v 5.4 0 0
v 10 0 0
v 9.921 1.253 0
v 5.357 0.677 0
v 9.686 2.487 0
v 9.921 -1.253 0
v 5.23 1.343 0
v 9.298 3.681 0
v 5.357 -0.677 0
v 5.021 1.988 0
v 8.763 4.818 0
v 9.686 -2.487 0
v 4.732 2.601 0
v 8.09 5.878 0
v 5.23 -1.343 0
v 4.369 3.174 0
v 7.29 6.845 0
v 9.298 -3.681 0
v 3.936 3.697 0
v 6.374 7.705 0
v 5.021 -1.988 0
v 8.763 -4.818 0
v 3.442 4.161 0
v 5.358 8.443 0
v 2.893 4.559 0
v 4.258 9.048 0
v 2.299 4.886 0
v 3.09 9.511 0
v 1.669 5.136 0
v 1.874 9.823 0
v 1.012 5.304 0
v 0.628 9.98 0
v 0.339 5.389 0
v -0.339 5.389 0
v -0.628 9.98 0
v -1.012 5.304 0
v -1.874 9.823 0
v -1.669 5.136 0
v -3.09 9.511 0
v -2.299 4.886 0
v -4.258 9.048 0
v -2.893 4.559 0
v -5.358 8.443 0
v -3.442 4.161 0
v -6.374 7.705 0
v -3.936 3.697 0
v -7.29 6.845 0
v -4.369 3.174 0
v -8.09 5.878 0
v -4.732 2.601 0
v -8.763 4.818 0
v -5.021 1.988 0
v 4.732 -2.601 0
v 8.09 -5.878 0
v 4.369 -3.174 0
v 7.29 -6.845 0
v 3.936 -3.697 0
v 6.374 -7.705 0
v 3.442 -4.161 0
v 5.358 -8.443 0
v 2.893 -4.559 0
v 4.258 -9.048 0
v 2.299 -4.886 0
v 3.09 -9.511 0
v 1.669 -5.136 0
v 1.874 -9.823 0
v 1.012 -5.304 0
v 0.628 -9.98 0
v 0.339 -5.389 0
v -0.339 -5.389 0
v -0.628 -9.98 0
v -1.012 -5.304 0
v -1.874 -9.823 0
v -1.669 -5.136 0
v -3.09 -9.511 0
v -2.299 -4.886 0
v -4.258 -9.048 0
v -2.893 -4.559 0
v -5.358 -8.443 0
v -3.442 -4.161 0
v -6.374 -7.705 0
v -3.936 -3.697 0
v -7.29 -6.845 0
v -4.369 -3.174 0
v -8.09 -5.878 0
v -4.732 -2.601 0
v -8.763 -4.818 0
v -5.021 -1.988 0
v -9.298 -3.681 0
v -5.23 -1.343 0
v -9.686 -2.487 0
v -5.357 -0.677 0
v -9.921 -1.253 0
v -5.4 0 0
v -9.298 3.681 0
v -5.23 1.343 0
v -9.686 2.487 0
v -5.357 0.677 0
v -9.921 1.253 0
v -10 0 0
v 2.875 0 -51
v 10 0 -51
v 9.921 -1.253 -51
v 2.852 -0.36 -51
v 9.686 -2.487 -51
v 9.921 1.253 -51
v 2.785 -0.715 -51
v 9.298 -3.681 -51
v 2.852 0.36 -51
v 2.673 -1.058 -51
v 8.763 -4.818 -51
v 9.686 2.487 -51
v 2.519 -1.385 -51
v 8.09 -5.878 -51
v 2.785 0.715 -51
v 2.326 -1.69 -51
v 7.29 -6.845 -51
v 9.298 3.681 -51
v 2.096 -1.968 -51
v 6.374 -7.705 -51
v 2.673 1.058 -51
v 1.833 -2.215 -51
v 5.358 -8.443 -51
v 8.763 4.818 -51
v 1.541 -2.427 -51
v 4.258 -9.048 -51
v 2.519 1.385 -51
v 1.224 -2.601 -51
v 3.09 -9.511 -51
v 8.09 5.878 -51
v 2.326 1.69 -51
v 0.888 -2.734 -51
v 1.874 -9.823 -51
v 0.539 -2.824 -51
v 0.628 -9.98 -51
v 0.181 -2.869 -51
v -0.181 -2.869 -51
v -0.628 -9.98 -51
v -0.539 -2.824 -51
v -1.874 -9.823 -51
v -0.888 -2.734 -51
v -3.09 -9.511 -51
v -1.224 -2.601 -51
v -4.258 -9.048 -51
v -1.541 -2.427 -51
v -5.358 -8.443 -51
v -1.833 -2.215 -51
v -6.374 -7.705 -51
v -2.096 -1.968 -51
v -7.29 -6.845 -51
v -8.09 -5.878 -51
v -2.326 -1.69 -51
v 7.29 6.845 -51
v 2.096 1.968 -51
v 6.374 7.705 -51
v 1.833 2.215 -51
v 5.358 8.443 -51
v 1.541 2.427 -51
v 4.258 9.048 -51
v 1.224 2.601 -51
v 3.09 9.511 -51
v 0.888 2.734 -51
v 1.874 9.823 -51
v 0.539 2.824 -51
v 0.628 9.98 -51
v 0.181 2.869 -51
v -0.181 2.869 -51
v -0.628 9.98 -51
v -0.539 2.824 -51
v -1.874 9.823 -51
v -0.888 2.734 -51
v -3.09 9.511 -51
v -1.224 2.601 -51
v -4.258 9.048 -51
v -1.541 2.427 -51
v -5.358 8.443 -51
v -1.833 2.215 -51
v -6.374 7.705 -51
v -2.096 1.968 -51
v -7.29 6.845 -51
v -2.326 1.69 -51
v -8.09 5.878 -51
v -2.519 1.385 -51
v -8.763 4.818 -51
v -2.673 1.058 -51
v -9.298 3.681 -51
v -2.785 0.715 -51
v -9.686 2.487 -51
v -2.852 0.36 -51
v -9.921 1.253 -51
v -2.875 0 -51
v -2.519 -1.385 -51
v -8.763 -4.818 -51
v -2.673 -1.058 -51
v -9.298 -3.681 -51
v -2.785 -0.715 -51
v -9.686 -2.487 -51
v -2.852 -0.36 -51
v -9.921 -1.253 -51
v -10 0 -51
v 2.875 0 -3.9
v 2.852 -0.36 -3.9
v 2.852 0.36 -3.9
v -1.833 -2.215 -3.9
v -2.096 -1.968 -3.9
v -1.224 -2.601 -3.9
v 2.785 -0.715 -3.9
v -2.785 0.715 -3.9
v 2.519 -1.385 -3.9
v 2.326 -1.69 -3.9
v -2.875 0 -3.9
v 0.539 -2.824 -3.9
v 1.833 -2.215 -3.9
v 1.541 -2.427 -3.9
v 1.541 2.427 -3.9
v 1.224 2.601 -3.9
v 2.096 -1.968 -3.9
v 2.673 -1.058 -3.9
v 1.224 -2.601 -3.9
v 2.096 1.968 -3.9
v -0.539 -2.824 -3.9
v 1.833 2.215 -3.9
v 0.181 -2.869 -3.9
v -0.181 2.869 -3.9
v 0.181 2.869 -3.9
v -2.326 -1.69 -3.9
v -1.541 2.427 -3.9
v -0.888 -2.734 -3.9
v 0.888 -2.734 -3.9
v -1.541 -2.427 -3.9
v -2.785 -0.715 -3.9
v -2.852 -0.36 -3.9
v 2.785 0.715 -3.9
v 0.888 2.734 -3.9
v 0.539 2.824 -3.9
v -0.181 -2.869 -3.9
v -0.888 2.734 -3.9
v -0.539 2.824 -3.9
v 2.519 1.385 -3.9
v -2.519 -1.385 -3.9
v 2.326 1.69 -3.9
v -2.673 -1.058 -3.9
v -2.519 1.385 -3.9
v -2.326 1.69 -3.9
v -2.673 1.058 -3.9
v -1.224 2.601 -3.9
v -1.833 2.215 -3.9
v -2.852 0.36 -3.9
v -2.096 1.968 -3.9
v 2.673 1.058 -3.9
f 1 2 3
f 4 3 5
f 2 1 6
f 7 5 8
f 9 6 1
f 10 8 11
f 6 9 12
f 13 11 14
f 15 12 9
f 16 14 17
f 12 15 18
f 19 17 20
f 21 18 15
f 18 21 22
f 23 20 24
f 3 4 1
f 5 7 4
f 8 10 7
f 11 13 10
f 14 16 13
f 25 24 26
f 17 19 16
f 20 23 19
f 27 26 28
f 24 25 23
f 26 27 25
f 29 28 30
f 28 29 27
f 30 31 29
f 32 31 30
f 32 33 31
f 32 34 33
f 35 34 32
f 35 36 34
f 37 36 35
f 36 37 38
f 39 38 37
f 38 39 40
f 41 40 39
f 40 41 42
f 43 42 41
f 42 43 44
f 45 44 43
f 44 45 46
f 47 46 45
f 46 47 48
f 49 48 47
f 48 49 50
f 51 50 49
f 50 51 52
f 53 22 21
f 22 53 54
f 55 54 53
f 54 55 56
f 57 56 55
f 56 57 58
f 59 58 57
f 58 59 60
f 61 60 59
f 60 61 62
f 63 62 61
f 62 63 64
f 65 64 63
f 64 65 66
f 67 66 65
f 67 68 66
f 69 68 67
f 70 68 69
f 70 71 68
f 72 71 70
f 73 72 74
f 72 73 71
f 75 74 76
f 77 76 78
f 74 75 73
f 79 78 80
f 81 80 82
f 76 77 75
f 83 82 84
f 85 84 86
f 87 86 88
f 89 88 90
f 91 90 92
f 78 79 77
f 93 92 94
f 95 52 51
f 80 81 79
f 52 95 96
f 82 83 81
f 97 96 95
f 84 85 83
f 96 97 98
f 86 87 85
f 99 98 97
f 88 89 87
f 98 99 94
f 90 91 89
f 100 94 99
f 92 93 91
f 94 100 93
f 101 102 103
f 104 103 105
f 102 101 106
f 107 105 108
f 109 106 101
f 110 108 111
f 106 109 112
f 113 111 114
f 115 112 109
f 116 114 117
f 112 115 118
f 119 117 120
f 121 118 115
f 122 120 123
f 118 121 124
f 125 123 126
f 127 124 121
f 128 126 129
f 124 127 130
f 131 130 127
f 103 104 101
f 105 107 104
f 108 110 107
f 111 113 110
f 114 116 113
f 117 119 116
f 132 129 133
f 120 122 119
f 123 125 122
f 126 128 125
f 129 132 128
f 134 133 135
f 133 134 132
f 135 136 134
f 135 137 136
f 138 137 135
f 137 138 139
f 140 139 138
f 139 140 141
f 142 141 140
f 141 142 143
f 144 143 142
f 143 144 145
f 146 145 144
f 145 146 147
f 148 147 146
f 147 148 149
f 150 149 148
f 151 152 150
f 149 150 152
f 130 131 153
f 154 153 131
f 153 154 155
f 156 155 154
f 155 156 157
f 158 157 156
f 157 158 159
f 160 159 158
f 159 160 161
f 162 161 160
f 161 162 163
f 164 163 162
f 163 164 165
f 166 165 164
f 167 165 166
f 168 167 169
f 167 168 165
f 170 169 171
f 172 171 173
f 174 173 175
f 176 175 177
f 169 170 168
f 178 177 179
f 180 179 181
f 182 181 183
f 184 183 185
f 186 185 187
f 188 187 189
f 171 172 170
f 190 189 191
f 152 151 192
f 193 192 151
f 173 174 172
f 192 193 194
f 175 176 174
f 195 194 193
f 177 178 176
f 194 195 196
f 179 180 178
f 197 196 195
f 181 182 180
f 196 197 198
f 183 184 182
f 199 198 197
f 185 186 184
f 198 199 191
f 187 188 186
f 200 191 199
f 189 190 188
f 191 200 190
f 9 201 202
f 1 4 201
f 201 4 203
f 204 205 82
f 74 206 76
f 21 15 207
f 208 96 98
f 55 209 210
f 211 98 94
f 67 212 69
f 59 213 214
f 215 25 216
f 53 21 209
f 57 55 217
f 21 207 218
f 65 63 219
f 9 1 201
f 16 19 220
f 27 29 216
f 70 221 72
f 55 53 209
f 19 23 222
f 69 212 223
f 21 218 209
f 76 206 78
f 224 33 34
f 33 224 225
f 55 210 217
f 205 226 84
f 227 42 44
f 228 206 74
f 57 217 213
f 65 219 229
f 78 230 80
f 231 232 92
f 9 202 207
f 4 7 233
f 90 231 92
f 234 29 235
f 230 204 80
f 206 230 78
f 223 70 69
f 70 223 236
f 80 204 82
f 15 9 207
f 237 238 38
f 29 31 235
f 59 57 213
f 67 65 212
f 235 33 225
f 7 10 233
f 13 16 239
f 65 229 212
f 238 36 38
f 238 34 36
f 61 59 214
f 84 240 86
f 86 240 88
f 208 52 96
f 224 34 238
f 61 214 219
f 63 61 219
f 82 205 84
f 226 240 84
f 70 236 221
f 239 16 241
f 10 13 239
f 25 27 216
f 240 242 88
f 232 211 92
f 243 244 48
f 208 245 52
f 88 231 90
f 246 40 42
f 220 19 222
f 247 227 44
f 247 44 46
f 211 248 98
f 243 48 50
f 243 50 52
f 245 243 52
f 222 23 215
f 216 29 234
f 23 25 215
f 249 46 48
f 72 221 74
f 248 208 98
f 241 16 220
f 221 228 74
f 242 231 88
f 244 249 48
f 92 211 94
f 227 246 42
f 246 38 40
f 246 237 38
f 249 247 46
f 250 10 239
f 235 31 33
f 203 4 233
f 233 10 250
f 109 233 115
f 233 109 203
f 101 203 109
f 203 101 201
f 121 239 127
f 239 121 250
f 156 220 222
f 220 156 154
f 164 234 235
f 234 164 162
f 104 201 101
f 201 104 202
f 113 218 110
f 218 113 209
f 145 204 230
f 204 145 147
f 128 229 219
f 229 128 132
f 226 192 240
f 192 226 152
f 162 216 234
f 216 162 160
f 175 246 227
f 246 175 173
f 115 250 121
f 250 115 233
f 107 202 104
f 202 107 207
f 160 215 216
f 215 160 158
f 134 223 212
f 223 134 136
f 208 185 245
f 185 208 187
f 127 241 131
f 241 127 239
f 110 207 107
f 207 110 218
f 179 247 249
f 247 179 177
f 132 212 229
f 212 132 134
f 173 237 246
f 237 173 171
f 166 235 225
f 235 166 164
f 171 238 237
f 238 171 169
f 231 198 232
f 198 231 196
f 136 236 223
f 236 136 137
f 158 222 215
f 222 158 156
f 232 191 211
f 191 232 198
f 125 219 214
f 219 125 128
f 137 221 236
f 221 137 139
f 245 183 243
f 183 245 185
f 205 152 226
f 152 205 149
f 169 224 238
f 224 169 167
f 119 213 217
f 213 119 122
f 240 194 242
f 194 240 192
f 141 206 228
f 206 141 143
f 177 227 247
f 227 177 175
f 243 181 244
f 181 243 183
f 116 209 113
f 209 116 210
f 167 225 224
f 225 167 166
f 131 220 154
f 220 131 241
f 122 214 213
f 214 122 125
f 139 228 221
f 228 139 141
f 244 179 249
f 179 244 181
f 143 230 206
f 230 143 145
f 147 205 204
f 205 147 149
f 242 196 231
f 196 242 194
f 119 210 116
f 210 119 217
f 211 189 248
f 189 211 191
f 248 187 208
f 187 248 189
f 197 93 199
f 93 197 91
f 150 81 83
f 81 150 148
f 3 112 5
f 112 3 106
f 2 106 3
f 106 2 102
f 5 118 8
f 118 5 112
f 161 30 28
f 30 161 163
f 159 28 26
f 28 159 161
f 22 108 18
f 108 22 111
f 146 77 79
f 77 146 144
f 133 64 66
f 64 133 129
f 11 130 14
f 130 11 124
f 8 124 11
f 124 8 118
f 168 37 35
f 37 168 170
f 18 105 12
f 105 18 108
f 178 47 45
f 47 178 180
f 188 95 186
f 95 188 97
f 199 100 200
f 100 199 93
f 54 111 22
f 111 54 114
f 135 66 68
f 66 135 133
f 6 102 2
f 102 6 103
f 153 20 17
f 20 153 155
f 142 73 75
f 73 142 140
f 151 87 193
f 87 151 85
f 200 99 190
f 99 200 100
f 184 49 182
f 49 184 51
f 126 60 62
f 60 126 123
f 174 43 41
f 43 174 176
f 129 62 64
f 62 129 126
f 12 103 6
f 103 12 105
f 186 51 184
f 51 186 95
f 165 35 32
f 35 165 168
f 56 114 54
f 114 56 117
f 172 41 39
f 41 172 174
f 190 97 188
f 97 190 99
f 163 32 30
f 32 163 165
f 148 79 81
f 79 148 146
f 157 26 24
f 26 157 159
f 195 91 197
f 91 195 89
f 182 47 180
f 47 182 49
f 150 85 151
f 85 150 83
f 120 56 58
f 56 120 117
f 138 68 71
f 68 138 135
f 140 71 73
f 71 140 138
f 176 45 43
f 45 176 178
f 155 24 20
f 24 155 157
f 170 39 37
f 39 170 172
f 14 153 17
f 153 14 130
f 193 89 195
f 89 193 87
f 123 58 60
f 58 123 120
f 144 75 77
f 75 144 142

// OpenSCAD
$fn = 50;


difference() {
	union() {
		translate(v = [0, 0, -51.0000000000]) {
			cylinder(h = 51, r = 10.0000000000);
		}
		cylinder(h = 0, r = 20.0000000000);
	}
	union() {
		translate(v = [0, 0, 0]) {
			rotate(a = [0, 0, 0]) {
				difference() {
					union() {
						#translate(v = [0, 0, -51.0000000000]) {
							cylinder(h = 51, r = 2.6000000000);
						}
						#translate(v = [0, 0, -3.9000000000]) {
							cylinder(h = 3.9000000000, r = 10.0000000000, r1 = 2.8750000000, r2 = 5.4000000000);
						}
						#translate(v = [0, 0, -51.0000000000]) {
							cylinder(h = 51, r = 2.8750000000);
						}
						#translate(v = [0, 0, -51.0000000000]) {
							cylinder(h = 51, r = 2.6000000000);
						}
					}
					union();
				}
			}
		}
	}
}
